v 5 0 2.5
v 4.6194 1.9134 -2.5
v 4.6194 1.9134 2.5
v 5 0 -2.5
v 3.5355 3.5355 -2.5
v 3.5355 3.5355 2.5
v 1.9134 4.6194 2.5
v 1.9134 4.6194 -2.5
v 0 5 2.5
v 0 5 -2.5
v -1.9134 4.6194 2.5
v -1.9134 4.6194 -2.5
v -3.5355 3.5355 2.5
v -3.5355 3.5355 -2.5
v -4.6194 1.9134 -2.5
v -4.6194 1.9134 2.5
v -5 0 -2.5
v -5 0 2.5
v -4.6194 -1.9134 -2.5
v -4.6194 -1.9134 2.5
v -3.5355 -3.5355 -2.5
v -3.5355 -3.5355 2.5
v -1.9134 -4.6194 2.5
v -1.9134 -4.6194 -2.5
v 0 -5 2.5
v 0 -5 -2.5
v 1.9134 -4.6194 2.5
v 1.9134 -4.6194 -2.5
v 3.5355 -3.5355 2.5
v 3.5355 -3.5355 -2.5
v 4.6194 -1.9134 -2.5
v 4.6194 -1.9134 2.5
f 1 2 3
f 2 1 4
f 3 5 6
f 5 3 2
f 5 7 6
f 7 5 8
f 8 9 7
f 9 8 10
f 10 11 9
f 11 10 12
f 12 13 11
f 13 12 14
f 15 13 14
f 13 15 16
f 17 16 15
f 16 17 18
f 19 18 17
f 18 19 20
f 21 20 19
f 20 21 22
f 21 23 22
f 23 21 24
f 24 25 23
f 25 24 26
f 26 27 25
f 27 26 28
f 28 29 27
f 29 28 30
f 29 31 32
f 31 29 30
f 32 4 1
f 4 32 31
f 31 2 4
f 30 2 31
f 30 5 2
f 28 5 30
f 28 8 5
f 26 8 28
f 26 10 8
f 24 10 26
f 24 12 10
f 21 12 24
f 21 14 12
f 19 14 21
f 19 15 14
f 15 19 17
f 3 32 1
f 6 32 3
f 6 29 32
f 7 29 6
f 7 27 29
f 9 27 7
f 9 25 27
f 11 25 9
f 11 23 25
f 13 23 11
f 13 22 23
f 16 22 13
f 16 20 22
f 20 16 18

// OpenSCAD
/*********************
** 360Rig Paramters **
*********************/

//Radius 
r=5; //[4:10]
//height
h=5; //[4:10]

cylinder(r=r,h = h,center=true);
